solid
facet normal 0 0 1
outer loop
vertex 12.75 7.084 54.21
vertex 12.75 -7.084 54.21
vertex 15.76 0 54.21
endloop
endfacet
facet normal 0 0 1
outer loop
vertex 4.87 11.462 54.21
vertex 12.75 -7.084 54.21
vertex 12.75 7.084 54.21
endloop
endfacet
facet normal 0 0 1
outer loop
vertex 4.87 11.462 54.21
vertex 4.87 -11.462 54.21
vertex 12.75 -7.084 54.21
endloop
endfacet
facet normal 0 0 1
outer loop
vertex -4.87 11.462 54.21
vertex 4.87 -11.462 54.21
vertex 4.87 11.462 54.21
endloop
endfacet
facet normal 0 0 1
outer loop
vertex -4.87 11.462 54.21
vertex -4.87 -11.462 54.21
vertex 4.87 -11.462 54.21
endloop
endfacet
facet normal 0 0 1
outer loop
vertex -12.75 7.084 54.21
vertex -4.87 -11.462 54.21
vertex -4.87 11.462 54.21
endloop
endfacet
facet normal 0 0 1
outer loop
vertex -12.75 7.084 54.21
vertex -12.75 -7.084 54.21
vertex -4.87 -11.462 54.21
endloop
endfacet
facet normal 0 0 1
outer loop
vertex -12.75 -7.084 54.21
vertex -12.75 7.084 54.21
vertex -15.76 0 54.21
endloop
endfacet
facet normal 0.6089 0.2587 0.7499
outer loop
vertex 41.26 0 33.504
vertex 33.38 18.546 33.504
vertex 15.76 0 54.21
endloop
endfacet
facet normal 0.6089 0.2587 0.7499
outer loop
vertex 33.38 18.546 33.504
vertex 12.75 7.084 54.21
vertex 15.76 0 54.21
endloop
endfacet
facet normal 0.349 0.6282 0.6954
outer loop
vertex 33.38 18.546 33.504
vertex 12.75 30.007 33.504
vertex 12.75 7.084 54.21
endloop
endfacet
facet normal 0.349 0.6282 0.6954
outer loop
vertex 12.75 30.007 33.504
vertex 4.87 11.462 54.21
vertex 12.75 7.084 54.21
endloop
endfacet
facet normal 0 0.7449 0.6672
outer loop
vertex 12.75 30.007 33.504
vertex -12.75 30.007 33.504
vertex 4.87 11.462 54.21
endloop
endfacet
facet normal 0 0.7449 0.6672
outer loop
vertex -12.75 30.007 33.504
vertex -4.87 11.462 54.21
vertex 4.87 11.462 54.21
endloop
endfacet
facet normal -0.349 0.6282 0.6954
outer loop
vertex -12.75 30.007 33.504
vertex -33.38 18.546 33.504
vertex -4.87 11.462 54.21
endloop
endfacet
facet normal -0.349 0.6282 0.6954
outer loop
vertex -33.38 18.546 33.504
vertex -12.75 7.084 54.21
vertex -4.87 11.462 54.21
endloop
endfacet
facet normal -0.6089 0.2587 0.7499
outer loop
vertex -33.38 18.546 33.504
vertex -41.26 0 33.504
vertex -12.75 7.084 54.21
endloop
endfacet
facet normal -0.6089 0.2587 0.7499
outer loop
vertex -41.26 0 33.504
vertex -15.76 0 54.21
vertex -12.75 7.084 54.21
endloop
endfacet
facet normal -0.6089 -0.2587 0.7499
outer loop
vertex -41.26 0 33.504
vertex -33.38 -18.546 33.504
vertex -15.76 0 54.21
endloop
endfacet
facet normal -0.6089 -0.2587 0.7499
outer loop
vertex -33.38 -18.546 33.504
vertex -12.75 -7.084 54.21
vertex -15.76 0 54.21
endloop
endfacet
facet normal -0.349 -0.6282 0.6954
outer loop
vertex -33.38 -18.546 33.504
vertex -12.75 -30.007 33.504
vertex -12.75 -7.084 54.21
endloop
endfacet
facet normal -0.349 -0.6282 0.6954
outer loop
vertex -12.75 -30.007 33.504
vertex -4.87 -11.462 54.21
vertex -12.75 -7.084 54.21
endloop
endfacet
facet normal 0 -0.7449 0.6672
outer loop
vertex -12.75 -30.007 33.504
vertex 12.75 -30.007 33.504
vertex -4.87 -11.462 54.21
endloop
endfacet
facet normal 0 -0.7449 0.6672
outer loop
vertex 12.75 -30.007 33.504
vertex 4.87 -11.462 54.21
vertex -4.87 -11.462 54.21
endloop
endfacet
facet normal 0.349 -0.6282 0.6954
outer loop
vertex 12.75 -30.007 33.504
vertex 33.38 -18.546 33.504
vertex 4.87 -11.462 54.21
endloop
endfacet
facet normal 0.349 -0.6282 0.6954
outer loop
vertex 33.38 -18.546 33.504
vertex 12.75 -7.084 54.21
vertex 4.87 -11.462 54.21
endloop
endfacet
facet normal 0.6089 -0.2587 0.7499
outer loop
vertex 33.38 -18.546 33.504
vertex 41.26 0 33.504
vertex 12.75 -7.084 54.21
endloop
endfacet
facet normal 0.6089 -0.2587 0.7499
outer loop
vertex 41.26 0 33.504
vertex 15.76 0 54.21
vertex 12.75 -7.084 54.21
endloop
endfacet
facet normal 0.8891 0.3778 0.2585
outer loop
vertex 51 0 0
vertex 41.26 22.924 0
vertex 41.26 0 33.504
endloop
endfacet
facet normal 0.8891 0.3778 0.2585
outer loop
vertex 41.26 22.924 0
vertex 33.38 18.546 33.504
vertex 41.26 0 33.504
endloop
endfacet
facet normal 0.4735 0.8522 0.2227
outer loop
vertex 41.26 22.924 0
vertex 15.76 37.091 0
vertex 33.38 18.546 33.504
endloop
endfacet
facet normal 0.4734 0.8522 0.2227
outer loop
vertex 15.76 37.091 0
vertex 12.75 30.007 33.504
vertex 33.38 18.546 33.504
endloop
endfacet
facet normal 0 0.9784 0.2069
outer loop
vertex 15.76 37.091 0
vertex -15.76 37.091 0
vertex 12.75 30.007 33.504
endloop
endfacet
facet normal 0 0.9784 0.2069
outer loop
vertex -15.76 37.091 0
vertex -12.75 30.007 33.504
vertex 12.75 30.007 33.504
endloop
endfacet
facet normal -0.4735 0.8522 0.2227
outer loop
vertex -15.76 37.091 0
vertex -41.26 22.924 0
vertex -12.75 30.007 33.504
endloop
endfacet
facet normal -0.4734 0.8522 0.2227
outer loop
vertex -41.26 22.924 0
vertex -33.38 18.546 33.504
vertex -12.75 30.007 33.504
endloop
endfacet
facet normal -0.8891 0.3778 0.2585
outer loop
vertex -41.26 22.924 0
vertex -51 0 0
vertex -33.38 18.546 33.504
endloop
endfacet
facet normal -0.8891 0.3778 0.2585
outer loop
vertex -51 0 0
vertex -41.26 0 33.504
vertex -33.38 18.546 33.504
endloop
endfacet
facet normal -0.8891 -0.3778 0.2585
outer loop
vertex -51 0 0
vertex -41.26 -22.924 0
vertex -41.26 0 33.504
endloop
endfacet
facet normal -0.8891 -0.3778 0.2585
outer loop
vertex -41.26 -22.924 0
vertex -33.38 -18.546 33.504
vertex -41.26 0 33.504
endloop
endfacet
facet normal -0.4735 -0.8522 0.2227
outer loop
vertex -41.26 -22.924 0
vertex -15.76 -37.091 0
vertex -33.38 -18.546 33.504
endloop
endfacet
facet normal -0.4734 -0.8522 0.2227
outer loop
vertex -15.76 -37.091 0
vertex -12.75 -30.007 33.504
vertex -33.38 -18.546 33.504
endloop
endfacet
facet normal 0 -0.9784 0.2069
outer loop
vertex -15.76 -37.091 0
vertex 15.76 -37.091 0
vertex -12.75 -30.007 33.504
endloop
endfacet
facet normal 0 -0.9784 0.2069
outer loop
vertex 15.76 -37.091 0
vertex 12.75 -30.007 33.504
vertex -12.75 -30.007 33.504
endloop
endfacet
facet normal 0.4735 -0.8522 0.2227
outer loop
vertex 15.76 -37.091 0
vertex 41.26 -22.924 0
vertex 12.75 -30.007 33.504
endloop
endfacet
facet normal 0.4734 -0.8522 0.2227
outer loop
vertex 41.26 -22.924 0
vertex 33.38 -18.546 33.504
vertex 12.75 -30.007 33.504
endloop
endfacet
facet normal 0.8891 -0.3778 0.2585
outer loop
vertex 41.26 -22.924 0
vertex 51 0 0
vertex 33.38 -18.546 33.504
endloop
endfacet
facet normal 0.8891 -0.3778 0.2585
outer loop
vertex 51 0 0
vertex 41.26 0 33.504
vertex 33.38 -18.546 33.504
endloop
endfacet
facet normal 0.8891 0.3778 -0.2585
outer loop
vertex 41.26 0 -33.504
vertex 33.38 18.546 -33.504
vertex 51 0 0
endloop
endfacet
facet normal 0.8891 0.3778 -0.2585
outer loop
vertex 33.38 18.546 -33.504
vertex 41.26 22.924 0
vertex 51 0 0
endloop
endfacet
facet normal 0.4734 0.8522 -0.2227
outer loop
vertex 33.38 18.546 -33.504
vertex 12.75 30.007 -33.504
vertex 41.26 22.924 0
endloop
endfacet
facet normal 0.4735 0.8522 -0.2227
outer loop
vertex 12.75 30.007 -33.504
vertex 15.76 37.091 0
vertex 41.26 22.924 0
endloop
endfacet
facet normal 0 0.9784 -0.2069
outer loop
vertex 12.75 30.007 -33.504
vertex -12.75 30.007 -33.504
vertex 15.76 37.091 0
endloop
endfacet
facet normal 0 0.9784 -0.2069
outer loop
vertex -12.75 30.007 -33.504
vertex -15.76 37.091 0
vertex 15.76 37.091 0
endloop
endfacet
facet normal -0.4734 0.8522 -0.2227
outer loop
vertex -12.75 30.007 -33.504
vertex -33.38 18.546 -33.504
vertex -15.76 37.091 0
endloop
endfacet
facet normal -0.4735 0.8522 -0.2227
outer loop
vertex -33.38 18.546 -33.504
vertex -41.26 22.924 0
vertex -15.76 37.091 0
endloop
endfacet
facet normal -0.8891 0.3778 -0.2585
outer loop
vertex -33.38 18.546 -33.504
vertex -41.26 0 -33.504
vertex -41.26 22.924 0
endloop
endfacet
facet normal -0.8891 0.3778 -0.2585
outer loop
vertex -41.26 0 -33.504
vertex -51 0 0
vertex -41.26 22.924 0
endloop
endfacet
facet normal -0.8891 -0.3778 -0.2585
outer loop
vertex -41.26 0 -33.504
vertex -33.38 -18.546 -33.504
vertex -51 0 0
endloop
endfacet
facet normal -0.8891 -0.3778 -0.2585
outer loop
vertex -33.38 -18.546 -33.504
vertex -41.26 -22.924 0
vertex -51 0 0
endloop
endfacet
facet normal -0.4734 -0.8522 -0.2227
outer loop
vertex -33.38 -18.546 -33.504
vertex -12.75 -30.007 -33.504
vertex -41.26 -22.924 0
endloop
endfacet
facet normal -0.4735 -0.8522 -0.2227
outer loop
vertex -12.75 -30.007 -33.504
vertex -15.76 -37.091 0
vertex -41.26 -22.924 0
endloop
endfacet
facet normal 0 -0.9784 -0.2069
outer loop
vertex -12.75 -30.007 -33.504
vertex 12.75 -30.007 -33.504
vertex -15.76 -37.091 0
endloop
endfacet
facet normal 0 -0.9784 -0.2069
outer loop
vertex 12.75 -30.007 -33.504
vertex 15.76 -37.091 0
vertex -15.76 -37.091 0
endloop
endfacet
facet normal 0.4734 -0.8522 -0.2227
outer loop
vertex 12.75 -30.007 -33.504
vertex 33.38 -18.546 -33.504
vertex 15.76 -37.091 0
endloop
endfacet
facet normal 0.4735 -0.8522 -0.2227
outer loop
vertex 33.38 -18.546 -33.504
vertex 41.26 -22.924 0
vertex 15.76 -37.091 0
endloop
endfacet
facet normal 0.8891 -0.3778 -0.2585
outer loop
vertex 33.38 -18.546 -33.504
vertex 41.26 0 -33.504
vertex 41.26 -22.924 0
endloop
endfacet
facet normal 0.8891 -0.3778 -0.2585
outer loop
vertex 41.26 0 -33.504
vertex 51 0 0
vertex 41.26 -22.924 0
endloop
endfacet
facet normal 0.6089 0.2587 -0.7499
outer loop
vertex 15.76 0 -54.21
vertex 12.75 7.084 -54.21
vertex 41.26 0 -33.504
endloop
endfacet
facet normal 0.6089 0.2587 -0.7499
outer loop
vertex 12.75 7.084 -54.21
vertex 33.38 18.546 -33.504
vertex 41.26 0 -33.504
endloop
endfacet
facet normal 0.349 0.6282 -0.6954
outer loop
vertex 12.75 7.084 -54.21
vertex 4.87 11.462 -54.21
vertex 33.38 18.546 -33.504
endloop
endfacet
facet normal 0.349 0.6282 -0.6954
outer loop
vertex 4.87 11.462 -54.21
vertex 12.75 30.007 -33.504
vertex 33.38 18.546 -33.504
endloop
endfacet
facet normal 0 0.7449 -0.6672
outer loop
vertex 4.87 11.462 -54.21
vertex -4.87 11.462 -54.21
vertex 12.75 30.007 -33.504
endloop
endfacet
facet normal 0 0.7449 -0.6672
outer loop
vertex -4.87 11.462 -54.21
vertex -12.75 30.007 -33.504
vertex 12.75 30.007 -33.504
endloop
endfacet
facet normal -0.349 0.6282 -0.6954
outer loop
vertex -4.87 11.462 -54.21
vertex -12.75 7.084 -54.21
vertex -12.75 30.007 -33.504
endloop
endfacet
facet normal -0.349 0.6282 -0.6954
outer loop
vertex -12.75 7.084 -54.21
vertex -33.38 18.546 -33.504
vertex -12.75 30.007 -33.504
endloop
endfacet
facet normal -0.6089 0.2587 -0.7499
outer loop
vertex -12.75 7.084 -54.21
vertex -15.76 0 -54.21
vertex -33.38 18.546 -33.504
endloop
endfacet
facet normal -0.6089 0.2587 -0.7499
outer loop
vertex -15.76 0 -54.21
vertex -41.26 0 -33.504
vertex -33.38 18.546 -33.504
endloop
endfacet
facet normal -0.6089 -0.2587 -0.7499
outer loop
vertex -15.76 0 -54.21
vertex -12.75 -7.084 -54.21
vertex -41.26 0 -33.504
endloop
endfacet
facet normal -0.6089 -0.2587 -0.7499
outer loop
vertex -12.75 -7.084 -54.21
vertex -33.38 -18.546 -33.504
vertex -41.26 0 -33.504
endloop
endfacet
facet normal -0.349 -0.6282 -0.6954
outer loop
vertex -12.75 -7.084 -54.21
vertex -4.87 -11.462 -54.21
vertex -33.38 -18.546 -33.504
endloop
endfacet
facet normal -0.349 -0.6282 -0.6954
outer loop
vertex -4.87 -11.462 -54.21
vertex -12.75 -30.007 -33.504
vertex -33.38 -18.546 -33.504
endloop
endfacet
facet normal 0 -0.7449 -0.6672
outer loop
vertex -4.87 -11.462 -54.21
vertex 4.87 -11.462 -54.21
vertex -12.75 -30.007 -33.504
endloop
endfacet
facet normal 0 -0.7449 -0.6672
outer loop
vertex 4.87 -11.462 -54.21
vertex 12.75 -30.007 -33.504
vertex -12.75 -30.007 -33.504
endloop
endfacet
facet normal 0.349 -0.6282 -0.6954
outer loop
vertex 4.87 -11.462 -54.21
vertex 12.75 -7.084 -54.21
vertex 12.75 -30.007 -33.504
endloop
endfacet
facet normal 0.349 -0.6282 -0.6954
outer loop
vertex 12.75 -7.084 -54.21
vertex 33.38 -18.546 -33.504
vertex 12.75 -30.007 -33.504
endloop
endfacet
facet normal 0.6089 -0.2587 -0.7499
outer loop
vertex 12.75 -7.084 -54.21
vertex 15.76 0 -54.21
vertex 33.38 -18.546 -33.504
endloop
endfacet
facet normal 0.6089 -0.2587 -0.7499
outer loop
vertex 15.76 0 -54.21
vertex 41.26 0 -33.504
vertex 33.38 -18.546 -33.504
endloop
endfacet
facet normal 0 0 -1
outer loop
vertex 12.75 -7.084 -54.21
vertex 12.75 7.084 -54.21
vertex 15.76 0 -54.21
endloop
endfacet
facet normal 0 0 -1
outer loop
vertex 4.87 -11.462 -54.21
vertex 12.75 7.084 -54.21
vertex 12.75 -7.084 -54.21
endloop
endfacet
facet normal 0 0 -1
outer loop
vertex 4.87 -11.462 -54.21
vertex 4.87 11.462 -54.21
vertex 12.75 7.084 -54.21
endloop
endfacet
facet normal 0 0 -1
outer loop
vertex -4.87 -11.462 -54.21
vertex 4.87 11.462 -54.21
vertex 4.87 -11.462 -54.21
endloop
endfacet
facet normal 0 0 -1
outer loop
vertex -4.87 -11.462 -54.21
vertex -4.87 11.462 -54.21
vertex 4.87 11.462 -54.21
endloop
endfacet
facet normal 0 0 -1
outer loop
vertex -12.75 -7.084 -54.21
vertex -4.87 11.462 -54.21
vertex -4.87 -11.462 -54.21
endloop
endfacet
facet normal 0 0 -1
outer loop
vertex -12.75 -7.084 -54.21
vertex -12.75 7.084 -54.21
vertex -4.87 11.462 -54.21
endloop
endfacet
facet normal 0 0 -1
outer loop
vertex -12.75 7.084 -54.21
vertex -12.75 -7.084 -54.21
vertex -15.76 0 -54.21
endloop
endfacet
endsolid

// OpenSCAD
// Generated by SolidPython 1.0.1 on 2020-07-29 00:46:53


scale(v = [17, 13, 19]) {
	sphere(r = 3);
}
/***********************************************
*********      SolidPython code:      **********
************************************************
 
# import packages: SolidPython
from solid import *
from solid.utils import *
from itertools import chain, combinations, permutations


class Resize:

    def __init__(self, scad_file):
        self.scad_file = scad_file
        #self.scad_file = import_scad(scad_file)
        # cone/cylinder param:
        self.r1 = 0
        self.r2 = 0
        self.h = 0
        # rectangular prism param:
        self.w = 0
        self.l = 0
        # ellipse param:
        self.r = 0

    # import OpenScad code (file name corresponds to shape)


    # classify shape + parameters
    def assign(self, param1, param2, param3):
        if self.scad_file == 'cone.scad':
            self.r1 = param1
            self.r2 = param2
            self.h = param3
        elif self.scad_file == 'cylinder.scad':
            self.r1 = param1
            self.r2 = param2
            self.h = param3
        elif self.scad_file == 'rectangularPrism.scad':
            self.h = param1
            self.l = param2
            self.w = param3
        else:
            self.r = param1
            self.h = param2

    # resize parameters
    def iterate(self):
        x = range(3, 20, 2)
        i = 1
        if self.scad_file == 'cone.scad':
            tempList = list(permutations(x, 2))
            for temp in tempList:
                param1 = temp[0]
                param2 = temp[1]
                filepath = 'produced_scad_files/' + 'cone' + str(param1) + '_' + str(param2) + '_' + '.scad'
                scad_render_to_file(cylinder(h=param1, r1=param2, r2=0), filepath)

        elif self.scad_file == 'cylinder.scad':
            tempList = list(permutations(x, 3))
            for temp in tempList:
                param1 = temp[0]
                param2 = temp[1]
                filepath = 'produced_scad_files/' + 'cylinder' + str(param1) + '_' + str(param2) + '_' + '.scad'
                scad_render_to_file(cylinder(h=param1, r1=param2, r2=param2), filepath)

        elif self.scad_file == 'rectangularPrism.scad':
            tempList = list(permutations(x, 3))
            for temp in tempList:
                param1 = temp[0]
                param2 = temp[1]
                param3 = temp[2]
                filepath = 'produced_scad_files/' + 'rectangularPrism' + str(param1) + '_' + str(param2) + '_' + str(
                    param3) + '.scad'
                scad_render_to_file(cube(size=(param1, param2, param3)), filepath)

        elif self.scad_file == 'ellipse.scad':
            tempList = list(permutations(x, 4))
            for temp in tempList:
                param1 = temp[0]
                param2 = temp[1]
                param3 = temp[2]
                param4 = temp[3]
                filepath = 'produced_scad_files/' + 'ellipse' + str(param1) + '_' + str(param2) + '_' + str(param3) + '_' + str(param4) + '.scad'
                scad_render_to_file(scale([param1, param2, param3])(sphere(r=param4)), filepath)

    def render_to_scadfile(self):
        scad_render_to_file(scad, 'example.scad') 
 
************************************************/
